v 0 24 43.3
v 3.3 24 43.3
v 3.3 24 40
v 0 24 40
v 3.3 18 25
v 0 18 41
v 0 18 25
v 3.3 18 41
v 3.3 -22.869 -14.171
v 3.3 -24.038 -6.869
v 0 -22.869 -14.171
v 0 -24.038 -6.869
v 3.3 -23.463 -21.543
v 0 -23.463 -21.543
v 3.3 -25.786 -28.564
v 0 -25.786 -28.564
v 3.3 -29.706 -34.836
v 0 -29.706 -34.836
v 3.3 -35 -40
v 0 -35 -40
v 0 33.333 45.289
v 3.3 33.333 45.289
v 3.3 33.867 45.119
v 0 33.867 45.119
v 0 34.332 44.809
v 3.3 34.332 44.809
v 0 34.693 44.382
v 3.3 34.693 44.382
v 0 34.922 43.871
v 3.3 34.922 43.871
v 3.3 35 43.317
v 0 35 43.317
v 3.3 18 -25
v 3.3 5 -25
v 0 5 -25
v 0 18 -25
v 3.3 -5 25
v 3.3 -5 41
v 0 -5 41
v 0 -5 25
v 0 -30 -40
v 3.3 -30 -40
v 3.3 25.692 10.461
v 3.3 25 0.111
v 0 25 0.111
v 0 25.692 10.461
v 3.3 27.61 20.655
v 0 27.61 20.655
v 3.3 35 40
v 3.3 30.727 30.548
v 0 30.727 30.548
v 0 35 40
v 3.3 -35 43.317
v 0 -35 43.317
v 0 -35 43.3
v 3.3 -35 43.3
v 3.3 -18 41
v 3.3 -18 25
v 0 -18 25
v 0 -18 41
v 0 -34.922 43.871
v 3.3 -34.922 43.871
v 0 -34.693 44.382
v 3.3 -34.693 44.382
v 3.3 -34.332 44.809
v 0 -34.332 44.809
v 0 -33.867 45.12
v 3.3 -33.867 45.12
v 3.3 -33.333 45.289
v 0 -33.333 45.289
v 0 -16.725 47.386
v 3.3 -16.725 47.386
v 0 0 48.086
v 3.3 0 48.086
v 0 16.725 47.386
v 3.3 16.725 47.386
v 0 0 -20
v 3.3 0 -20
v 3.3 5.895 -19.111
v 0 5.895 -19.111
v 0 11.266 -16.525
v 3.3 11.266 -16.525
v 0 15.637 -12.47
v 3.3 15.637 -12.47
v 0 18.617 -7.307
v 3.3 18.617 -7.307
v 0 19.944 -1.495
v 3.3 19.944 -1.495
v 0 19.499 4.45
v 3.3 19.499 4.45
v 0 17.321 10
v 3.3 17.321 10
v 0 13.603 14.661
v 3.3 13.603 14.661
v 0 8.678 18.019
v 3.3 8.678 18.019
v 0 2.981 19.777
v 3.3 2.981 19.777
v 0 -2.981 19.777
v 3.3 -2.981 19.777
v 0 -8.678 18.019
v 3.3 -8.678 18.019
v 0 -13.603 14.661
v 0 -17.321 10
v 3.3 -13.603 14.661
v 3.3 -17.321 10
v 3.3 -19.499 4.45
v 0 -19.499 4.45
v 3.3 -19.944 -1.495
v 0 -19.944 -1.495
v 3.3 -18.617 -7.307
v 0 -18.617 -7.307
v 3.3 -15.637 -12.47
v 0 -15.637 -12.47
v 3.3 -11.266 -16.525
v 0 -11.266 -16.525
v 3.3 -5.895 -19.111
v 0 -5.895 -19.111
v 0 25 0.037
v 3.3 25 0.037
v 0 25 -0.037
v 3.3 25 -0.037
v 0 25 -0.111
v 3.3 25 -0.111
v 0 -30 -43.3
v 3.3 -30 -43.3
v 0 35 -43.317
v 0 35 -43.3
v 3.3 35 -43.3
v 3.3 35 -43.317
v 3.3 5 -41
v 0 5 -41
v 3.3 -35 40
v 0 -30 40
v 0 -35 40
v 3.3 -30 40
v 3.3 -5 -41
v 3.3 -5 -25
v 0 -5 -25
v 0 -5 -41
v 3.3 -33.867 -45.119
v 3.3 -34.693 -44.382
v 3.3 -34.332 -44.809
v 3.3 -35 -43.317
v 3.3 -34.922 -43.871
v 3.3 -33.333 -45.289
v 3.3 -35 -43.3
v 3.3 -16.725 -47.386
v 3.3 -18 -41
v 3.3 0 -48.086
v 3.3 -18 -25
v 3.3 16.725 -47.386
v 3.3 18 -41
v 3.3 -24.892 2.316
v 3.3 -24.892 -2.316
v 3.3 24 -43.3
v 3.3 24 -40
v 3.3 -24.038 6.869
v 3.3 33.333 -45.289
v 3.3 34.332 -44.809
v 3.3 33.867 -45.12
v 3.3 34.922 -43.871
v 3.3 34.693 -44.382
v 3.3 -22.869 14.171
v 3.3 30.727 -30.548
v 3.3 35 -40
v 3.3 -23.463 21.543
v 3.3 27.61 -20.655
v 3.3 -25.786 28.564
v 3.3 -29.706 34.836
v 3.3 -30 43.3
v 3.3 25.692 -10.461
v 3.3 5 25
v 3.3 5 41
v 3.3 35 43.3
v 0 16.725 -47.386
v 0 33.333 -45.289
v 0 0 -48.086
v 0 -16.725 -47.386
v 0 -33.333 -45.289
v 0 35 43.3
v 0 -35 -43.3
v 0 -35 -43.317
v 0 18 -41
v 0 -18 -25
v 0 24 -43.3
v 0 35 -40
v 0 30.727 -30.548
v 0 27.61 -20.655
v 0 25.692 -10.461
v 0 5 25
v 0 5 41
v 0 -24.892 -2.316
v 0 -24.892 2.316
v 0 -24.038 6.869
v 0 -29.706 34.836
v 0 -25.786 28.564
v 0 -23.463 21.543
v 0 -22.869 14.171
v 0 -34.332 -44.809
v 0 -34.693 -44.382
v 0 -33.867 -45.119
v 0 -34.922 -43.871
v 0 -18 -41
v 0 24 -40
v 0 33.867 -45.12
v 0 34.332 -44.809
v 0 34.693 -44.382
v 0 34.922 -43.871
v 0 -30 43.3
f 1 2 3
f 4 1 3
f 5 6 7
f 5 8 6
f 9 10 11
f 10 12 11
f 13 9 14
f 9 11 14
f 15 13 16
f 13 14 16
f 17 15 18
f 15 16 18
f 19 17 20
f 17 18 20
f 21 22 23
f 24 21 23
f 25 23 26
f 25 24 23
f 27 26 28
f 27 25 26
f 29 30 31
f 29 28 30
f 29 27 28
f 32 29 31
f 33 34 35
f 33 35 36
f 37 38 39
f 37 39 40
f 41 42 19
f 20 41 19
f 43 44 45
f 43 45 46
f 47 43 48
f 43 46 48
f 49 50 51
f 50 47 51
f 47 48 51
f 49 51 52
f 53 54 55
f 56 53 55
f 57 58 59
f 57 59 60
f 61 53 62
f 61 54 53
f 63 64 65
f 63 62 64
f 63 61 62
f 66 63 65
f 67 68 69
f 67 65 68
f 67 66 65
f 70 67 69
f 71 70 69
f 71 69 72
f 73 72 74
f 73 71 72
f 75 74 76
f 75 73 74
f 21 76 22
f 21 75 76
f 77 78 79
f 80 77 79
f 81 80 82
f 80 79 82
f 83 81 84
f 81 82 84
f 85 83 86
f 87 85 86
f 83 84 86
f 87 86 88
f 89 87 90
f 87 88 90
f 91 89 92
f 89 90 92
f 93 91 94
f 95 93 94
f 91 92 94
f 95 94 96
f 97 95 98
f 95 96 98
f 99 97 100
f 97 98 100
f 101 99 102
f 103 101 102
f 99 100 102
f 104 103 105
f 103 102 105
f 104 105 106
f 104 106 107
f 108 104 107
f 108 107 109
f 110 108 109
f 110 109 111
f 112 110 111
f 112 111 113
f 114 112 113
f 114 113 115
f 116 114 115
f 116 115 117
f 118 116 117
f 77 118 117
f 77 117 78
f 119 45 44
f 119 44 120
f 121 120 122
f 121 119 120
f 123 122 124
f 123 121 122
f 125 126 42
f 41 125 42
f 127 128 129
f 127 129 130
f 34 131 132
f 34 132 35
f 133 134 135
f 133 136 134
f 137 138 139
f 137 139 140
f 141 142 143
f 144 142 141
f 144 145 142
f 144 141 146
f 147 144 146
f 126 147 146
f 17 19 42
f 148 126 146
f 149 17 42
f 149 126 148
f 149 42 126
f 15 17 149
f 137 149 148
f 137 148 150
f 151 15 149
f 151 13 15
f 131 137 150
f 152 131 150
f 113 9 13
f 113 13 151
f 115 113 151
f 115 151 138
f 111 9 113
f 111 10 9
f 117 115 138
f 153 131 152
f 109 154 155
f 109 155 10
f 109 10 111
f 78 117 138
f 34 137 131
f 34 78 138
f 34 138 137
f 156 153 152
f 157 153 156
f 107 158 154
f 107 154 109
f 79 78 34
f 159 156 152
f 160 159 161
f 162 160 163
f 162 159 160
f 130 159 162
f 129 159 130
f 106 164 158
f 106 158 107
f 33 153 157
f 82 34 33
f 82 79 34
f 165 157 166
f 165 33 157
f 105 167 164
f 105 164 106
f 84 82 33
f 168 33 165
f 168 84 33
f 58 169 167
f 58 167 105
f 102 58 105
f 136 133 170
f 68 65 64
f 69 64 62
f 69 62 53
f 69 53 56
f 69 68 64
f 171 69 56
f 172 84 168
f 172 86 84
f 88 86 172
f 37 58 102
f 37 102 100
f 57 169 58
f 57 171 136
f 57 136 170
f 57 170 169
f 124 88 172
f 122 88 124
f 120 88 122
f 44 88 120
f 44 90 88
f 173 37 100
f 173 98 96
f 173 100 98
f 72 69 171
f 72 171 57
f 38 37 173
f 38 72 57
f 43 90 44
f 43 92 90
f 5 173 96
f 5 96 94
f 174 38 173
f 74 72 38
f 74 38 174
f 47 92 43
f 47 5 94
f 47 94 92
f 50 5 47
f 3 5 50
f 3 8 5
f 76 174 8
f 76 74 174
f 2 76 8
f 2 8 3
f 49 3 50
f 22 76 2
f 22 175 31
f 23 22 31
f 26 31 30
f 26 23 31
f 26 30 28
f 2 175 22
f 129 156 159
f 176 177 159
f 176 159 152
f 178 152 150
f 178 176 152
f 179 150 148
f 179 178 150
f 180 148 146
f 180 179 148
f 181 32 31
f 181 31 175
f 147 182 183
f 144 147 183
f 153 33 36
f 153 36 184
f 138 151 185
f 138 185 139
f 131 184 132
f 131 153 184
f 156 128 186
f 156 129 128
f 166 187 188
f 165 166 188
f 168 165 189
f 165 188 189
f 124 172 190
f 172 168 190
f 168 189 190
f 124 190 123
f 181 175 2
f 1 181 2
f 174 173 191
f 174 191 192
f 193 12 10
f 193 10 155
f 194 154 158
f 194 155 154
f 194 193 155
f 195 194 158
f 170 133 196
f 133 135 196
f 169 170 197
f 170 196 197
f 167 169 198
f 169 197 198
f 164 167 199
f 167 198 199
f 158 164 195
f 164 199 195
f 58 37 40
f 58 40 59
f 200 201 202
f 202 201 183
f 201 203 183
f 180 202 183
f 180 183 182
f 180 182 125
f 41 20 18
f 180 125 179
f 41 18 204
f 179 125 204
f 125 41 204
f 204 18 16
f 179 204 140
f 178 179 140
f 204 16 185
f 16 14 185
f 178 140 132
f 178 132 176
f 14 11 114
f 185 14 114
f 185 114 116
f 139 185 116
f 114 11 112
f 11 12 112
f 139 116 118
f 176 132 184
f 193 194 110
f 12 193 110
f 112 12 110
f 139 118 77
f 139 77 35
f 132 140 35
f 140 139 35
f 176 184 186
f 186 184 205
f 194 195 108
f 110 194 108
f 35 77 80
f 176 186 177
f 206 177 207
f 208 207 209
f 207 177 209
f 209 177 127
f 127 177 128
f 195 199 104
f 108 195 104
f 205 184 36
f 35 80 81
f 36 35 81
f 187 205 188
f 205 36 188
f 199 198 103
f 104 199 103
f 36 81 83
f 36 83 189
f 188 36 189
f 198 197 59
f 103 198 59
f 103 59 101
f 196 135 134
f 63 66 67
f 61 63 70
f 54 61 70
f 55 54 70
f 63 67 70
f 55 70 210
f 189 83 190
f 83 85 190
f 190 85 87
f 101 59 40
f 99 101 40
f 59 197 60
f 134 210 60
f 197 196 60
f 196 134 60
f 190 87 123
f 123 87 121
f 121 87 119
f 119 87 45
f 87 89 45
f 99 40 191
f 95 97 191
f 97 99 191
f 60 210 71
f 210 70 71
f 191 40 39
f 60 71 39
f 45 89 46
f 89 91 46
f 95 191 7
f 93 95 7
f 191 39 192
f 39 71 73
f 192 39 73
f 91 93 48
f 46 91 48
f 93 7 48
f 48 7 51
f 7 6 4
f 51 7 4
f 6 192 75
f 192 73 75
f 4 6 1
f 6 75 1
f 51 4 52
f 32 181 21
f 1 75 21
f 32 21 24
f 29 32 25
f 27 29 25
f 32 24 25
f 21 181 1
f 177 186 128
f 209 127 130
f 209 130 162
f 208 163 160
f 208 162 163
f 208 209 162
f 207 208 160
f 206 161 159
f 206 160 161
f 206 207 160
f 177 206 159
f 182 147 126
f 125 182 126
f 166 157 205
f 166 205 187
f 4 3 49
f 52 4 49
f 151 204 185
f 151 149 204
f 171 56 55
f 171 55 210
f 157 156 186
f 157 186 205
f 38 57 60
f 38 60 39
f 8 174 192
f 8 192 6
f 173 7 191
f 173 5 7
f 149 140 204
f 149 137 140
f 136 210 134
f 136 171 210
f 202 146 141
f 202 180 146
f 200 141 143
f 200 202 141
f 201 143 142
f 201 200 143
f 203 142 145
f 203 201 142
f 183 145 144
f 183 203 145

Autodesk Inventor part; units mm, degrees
ref_plane "YZ Plane" through (0, 0, 0) normal (1, 0, 0) x (0, 1, 0)
ref_plane "XZ Plane" through (0, 0, 0) normal (0, 1, 0) x (-1, 0, 0)
ref_plane "XY Plane" through (0, 0, 0) normal (0, 0, 1) x (1, 0, 0)
sketch "Boceto1" plane through (0, 0, 0) normal (1, 0, 0) x (0, 1, 0)
  circle A0 centre (0, 0) radius 25
  line L0 (35, 43.3169) -> (35, 40)
  line L1 (-35, 43.3169) -> (-35, 40)
  line L2 (35, -40) -> (35, -43.3169)
  line L3 (-35, -40) -> (-35, -43.3169)
  arc A1 (33.3333, 45.289) -> (-33.3333, 45.289) centre (0, -151.9137) ccw
  arc A2 (-33.3333, -45.289) -> (33.3333, -45.289) centre (0, 151.9137) ccw
  arc A3 (-24.0379, 6.8686) -> (-35, 40) centre (-53.845, 15.3856) ccw
  arc A4 (-35, -40) -> (-24.0379, -6.8686) centre (-53.845, -15.3856) ccw
  arc A5 (35, 40) -> (24.9998, -0.1114) centre (111.9989, -0.499) ccw
  arc A6 (24.9998, 0.1114) -> (35, -40) centre (111.9989, 0.499) ccw
  arc A7 (35, 43.3169) -> (33.3333, 45.289) centre (33, 43.3169) ccw
  arc A8 (-33.3333, 45.289) -> (-35, 43.3169) centre (-33, 43.3169) ccw
  arc A9 (33.3333, -45.289) -> (35, -43.3169) centre (33, -43.3169) ccw
  arc A10 (-35, -43.3169) -> (-33.3333, -45.289) centre (-33, -43.3169) ccw
  point P0 (35, 45)
  point P1 (-35, 45)
  point P2 (35, -45)
  point P3 (-35, -45)
  dimension "d0" = 50
  dimension "d1" = 5
  dimension "d2" = 70
  dimension "d3" = 35
  dimension "d4" = 0
  dimension "d5" = 70
  dimension "d6" = 0
  dimension "d8" = 40
  dimension "d9" = 40
  dimension "d10" = 200
  dimension "d12" = 200
  dimension "d13" = 31
  dimension "d14" = 31
  dimension "d15" = 87
  dimension "d17" = 87
  dimension "d20" = 2
  dimension "d21" = 2
  dimension "d22" = 2
extrude "Extrusión1" add sketch "Boceto1" along normal blind 3.3
sketch "Boceto2" plane through (3.3, 0, 0) normal (1, 0, 0) x (0, 0, -1)
  arc A0 (-40, 35) -> (0, 25.0003) centre (0.499, 111.9989) ccw projected
  arc A1 (40, -35) -> (6.8686, -24.0379) centre (15.3856, -53.845) ccw projected
  arc A2 (0, 25.0003) -> (40, 35) centre (-0.499, 111.9989) ccw projected
  arc A3 (-6.8686, -24.0379) -> (-40, -35) centre (-15.3856, -53.845) ccw projected
  line L0 (-40, 35) -> (-43.3, 35)
  line L1 (-43.3, 35) -> (-43.3, 24)
  line L2 (-43.3, 24) -> (-40, 24)
  line L3 (-40, 24) -> (-40, 35)
  line L4 (-40, -35) -> (-43.3, -35)
  line L5 (-43.3, -35) -> (-43.3, -30)
  line L6 (-43.3, -30) -> (-40, -30)
  line L7 (-40, -30) -> (-40, -35)
  line L8 (40, 35) -> (43.3, 35)
  line L9 (43.3, 35) -> (43.3, 24)
  line L10 (43.3, 24) -> (40, 24)
  line L11 (40, 24) -> (40, 35)
  line L12 (40, -35) -> (43.3, -35)
  line L13 (43.3, -35) -> (43.3, -30)
  line L14 (43.3, -30) -> (40, -30)
  line L15 (40, -30) -> (40, -35)
  circle A4 centre (0, 0) radius 20
  line L16 (-41, 18) -> (-25, 18)
  line L17 (-25, 18) -> (-25, 5)
  line L18 (-25, 5) -> (-41, 5)
  line L19 (-41, 5) -> (-41, 18)
  line L20 (-41, -5) -> (-25, -5)
  line L21 (-25, -5) -> (-25, -18)
  line L22 (-25, -18) -> (-41, -18)
  line L23 (-41, -18) -> (-41, -5)
  line L24 (25, 18) -> (41, 18)
  line L25 (41, 18) -> (41, 5)
  line L26 (41, 5) -> (25, 5)
  line L27 (25, 5) -> (25, 18)
  line L28 (25, -5) -> (41, -5)
  line L29 (41, -5) -> (41, -18)
  line L30 (41, -18) -> (25, -18)
  line L31 (25, -18) -> (25, -5)
  point P0 (-6.2262, 34.4418)
  point P1 (12.6899, -32.6185)
  point P2 (6.2262, 34.4418)
  dimension "d31" = 40
  dimension "d23" = 3.3
  dimension "d24" = 3.3
  dimension "d25" = 3.3
  dimension "d26" = 3.3
  dimension "d27" = 11
  dimension "d28" = 5
  dimension "d34" = 16
  dimension "d35" = 13
  dimension "d37" = 25
  dimension "d38" = 5
  dimension "d40" = 5
  dimension "d41" = 25
extrude "Extrusión2" cut sketch "Boceto2" against normal blind 3.3
equation "\"d3\" = 0.5 * d2"
equation "\"d5\" = d2"
equation "\"d8\" = 0.5 * ancho_base"
equation "\"d9\" = d8"
equation "\"d14\" = d13"
equation "\"d17\" = d15"
equation "\"d25\" = d23"
equation "\"d41\" = d37"
equation "\"Radio_pliegue\" = Grosor"
equation "\"Anchura_desahogo_plegado\" = Grosor"
equation "\"Profundidad_desahogo_plegado\" = 0.5 * Grosor"
equation "\"Tamaño_destalonado\" = 4 * Grosor"
equation "\"Remanente_mínimo\" = 2 * Grosor"
equation "\"Radiodetransición\" = Radio_pliegue"
equation "\"Tamaño_de_radio_de_Jacobi\" = Grosor"
equation "\"TamañoSeparación\" = Grosor"
equation "\"Grosor\" = 0.5"
equation "\"ancho_base\" = 80"
properties part number "Cuerpo - Unión Laterales"
